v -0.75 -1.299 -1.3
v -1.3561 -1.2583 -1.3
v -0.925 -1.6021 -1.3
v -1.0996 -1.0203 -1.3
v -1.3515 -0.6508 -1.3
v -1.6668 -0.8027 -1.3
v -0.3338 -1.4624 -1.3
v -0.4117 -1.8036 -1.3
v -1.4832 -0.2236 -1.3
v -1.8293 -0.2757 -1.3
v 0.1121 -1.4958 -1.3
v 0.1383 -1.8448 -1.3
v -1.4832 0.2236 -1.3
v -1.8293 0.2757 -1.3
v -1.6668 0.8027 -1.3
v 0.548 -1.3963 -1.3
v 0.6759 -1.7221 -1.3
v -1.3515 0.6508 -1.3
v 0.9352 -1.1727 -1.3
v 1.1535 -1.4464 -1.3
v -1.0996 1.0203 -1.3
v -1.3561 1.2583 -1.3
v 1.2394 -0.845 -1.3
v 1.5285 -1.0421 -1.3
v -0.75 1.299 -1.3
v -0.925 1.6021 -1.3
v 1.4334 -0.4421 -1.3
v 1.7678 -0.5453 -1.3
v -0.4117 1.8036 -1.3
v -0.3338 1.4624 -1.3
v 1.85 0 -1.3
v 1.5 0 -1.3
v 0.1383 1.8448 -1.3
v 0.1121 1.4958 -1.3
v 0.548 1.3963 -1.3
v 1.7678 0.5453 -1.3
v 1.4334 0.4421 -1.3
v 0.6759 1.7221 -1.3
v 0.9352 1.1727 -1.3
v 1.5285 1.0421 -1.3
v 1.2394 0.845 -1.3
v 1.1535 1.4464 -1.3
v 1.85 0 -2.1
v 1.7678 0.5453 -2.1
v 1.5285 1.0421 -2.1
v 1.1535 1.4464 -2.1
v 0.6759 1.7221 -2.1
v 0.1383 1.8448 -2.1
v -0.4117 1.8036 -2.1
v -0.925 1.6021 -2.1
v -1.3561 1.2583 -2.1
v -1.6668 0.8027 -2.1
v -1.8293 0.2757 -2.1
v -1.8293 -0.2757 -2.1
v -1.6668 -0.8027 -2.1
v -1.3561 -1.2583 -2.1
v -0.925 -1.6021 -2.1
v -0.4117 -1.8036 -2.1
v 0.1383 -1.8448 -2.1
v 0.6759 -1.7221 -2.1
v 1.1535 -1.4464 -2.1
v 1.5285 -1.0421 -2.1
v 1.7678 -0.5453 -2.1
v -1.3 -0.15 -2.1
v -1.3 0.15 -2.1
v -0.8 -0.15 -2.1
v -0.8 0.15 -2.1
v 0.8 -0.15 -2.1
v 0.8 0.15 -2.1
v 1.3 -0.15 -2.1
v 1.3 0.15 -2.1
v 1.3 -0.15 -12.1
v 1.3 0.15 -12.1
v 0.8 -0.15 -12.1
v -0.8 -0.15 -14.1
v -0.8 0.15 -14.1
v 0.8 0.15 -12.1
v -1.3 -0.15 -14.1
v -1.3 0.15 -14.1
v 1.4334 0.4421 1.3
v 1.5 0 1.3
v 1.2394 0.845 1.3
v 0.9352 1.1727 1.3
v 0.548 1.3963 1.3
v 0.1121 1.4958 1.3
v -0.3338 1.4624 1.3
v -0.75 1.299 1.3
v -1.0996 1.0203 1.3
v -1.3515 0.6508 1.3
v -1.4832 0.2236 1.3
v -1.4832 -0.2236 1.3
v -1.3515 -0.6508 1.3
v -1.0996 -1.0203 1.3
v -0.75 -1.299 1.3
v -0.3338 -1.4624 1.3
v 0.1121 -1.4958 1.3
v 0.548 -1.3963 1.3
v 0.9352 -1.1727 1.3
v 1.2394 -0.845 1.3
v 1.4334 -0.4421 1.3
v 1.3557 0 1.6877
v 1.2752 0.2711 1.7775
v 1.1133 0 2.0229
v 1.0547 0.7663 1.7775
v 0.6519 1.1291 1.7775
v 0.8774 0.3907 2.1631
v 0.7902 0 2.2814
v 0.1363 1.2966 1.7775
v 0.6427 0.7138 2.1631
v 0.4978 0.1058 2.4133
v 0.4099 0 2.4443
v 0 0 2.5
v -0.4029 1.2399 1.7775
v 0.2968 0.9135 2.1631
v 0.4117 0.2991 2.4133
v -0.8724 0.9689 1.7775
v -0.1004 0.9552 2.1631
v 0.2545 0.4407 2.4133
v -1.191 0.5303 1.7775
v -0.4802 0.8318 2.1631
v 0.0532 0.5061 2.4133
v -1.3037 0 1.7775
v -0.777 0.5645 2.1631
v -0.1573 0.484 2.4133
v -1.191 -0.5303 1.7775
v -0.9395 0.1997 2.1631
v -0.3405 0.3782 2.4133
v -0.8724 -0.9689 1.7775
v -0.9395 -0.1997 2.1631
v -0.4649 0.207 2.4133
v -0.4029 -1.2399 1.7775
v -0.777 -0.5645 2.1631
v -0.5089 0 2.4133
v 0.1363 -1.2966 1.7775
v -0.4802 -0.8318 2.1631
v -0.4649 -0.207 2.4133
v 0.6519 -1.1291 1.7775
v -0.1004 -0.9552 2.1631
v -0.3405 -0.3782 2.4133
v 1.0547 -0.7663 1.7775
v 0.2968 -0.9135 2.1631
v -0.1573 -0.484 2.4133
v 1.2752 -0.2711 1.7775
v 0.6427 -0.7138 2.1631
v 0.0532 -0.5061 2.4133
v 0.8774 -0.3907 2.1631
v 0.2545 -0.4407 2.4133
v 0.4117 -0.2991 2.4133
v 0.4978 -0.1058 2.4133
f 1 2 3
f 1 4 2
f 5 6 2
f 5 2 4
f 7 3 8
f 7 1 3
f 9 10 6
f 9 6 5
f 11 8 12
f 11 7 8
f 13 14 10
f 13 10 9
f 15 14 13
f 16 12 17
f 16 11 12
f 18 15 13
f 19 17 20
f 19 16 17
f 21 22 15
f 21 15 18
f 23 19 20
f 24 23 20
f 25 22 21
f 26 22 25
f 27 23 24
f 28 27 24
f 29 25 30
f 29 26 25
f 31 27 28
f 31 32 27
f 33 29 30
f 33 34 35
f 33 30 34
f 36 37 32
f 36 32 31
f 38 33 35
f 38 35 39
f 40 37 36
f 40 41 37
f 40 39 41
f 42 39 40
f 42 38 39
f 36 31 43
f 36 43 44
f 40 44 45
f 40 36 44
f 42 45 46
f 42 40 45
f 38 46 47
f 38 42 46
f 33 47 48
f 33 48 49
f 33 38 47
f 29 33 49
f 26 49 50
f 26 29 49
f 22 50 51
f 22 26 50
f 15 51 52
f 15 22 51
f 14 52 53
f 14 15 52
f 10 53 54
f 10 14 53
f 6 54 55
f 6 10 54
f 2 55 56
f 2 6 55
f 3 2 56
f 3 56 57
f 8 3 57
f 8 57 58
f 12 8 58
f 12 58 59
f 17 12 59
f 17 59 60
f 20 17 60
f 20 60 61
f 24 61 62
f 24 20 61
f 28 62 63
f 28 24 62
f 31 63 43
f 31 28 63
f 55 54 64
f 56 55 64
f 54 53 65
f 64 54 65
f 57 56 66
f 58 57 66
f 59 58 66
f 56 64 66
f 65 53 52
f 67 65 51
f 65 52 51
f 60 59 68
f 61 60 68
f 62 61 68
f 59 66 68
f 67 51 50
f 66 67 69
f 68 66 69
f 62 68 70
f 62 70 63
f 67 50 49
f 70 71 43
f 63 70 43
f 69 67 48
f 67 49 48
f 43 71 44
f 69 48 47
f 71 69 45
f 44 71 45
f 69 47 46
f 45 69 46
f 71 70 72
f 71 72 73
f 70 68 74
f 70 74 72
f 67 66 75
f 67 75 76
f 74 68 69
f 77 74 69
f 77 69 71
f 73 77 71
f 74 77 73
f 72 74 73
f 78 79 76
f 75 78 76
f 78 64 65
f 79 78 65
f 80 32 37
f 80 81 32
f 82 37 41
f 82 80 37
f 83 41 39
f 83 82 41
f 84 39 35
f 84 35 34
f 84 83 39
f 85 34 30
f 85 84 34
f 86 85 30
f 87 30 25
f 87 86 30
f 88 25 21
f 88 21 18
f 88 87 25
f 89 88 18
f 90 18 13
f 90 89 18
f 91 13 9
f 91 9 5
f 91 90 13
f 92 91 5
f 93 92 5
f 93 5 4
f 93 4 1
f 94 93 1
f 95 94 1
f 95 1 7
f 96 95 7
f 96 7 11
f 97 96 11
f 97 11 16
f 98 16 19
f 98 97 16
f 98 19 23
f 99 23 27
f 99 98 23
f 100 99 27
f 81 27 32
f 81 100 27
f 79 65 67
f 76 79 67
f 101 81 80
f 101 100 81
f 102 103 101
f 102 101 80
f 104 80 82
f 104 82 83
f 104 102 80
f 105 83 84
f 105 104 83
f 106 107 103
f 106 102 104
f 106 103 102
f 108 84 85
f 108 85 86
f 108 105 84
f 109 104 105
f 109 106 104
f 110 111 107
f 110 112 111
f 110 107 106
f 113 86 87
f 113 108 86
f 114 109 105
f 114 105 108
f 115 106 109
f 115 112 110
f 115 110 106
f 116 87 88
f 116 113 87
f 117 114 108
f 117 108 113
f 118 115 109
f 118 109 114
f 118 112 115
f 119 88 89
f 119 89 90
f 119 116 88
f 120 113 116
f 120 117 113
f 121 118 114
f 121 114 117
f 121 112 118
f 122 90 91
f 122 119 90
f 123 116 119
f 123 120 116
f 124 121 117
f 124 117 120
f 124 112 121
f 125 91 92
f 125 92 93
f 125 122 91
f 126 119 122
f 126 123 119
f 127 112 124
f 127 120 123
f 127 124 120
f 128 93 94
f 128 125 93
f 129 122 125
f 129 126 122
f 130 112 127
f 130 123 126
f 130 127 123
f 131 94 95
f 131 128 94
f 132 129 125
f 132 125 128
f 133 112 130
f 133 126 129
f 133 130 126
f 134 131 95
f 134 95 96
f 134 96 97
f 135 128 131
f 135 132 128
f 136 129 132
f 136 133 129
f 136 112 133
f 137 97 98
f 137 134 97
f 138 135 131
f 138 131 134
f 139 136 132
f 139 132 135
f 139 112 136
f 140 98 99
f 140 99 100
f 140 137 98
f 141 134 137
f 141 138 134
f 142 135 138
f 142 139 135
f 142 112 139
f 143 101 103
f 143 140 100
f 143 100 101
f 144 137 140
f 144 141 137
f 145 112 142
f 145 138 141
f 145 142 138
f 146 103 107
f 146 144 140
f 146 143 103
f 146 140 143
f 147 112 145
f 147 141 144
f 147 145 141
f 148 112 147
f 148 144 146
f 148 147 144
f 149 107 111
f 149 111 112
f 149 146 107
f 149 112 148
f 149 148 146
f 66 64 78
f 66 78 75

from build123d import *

# Parameters (mm, degrees)
SKETCH1_R           = 1.5
BOSS_EXTRUDE1_DEPTH = 1.3
BOSS_EXTRUDE2_START = -1.3
SKETCH2_R           = 1.85
BOSS_EXTRUDE2_DEPTH = 0.8
DOME1_FACE_RADIUS   = 1.5
DOME1_HEIGHT        = 1.2
BOSS_EXTRUDE3_START = -2.1
SKETCH3_W           = 0.5
SKETCH3_H           = 0.3
BOSS_EXTRUDE3_DEPTH = 12
CUT_EXTRUDE1_START  = -14.1
SKETCH4_W           = 0.5
SKETCH4_H           = 0.3
CUT_EXTRUDE1_DEPTH  = 2


with BuildPart() as part:
    # Sketch1 → Boss-Extrude1 (new body, symmetric)
    with BuildSketch(Plane.XY):
        Circle(SKETCH1_R)
    extrude(amount=BOSS_EXTRUDE1_DEPTH, both=True)

    # Sketch2 → Boss-Extrude2 (add)
    with BuildSketch(Plane.XY.offset(BOSS_EXTRUDE2_START)):
        Circle(SKETCH2_R)
    extrude(amount=-BOSS_EXTRUDE2_DEPTH)

    # Dome1: a dome of height H over a round flat face of radius A is a cap of a sphere of radius (A * A + H * H) / (2 * H)
    dome1_r = (DOME1_FACE_RADIUS * DOME1_FACE_RADIUS + DOME1_HEIGHT * DOME1_HEIGHT) / (2 * DOME1_HEIGHT)
    dome1_base = Plane((0, 0, 1.3), z_dir=(0, 0, 1))
    with Locations(dome1_base.offset(DOME1_HEIGHT - dome1_r)):
        dome1_ball = Sphere(dome1_r, mode=Mode.PRIVATE)
    add(split(dome1_ball, bisect_by=dome1_base, keep=Keep.TOP, mode=Mode.PRIVATE))

    # Sketch3 → Boss-Extrude3 (add)
    with BuildSketch(Plane.XY.offset(BOSS_EXTRUDE3_START)):
        with Locations((1.05, 0)):
            Rectangle(SKETCH3_W, SKETCH3_H)
        with Locations((-1.05, 0)):
            Rectangle(SKETCH3_W, SKETCH3_H)
    extrude(amount=-BOSS_EXTRUDE3_DEPTH)

    # Sketch4 → Cut-Extrude1 (cut)
    with BuildSketch(Plane.XY.offset(CUT_EXTRUDE1_START)):
        with Locations((1.05, 0)):
            Rectangle(SKETCH4_W, SKETCH4_H)
    extrude(amount=CUT_EXTRUDE1_DEPTH, mode=Mode.SUBTRACT)


solid = part.part
